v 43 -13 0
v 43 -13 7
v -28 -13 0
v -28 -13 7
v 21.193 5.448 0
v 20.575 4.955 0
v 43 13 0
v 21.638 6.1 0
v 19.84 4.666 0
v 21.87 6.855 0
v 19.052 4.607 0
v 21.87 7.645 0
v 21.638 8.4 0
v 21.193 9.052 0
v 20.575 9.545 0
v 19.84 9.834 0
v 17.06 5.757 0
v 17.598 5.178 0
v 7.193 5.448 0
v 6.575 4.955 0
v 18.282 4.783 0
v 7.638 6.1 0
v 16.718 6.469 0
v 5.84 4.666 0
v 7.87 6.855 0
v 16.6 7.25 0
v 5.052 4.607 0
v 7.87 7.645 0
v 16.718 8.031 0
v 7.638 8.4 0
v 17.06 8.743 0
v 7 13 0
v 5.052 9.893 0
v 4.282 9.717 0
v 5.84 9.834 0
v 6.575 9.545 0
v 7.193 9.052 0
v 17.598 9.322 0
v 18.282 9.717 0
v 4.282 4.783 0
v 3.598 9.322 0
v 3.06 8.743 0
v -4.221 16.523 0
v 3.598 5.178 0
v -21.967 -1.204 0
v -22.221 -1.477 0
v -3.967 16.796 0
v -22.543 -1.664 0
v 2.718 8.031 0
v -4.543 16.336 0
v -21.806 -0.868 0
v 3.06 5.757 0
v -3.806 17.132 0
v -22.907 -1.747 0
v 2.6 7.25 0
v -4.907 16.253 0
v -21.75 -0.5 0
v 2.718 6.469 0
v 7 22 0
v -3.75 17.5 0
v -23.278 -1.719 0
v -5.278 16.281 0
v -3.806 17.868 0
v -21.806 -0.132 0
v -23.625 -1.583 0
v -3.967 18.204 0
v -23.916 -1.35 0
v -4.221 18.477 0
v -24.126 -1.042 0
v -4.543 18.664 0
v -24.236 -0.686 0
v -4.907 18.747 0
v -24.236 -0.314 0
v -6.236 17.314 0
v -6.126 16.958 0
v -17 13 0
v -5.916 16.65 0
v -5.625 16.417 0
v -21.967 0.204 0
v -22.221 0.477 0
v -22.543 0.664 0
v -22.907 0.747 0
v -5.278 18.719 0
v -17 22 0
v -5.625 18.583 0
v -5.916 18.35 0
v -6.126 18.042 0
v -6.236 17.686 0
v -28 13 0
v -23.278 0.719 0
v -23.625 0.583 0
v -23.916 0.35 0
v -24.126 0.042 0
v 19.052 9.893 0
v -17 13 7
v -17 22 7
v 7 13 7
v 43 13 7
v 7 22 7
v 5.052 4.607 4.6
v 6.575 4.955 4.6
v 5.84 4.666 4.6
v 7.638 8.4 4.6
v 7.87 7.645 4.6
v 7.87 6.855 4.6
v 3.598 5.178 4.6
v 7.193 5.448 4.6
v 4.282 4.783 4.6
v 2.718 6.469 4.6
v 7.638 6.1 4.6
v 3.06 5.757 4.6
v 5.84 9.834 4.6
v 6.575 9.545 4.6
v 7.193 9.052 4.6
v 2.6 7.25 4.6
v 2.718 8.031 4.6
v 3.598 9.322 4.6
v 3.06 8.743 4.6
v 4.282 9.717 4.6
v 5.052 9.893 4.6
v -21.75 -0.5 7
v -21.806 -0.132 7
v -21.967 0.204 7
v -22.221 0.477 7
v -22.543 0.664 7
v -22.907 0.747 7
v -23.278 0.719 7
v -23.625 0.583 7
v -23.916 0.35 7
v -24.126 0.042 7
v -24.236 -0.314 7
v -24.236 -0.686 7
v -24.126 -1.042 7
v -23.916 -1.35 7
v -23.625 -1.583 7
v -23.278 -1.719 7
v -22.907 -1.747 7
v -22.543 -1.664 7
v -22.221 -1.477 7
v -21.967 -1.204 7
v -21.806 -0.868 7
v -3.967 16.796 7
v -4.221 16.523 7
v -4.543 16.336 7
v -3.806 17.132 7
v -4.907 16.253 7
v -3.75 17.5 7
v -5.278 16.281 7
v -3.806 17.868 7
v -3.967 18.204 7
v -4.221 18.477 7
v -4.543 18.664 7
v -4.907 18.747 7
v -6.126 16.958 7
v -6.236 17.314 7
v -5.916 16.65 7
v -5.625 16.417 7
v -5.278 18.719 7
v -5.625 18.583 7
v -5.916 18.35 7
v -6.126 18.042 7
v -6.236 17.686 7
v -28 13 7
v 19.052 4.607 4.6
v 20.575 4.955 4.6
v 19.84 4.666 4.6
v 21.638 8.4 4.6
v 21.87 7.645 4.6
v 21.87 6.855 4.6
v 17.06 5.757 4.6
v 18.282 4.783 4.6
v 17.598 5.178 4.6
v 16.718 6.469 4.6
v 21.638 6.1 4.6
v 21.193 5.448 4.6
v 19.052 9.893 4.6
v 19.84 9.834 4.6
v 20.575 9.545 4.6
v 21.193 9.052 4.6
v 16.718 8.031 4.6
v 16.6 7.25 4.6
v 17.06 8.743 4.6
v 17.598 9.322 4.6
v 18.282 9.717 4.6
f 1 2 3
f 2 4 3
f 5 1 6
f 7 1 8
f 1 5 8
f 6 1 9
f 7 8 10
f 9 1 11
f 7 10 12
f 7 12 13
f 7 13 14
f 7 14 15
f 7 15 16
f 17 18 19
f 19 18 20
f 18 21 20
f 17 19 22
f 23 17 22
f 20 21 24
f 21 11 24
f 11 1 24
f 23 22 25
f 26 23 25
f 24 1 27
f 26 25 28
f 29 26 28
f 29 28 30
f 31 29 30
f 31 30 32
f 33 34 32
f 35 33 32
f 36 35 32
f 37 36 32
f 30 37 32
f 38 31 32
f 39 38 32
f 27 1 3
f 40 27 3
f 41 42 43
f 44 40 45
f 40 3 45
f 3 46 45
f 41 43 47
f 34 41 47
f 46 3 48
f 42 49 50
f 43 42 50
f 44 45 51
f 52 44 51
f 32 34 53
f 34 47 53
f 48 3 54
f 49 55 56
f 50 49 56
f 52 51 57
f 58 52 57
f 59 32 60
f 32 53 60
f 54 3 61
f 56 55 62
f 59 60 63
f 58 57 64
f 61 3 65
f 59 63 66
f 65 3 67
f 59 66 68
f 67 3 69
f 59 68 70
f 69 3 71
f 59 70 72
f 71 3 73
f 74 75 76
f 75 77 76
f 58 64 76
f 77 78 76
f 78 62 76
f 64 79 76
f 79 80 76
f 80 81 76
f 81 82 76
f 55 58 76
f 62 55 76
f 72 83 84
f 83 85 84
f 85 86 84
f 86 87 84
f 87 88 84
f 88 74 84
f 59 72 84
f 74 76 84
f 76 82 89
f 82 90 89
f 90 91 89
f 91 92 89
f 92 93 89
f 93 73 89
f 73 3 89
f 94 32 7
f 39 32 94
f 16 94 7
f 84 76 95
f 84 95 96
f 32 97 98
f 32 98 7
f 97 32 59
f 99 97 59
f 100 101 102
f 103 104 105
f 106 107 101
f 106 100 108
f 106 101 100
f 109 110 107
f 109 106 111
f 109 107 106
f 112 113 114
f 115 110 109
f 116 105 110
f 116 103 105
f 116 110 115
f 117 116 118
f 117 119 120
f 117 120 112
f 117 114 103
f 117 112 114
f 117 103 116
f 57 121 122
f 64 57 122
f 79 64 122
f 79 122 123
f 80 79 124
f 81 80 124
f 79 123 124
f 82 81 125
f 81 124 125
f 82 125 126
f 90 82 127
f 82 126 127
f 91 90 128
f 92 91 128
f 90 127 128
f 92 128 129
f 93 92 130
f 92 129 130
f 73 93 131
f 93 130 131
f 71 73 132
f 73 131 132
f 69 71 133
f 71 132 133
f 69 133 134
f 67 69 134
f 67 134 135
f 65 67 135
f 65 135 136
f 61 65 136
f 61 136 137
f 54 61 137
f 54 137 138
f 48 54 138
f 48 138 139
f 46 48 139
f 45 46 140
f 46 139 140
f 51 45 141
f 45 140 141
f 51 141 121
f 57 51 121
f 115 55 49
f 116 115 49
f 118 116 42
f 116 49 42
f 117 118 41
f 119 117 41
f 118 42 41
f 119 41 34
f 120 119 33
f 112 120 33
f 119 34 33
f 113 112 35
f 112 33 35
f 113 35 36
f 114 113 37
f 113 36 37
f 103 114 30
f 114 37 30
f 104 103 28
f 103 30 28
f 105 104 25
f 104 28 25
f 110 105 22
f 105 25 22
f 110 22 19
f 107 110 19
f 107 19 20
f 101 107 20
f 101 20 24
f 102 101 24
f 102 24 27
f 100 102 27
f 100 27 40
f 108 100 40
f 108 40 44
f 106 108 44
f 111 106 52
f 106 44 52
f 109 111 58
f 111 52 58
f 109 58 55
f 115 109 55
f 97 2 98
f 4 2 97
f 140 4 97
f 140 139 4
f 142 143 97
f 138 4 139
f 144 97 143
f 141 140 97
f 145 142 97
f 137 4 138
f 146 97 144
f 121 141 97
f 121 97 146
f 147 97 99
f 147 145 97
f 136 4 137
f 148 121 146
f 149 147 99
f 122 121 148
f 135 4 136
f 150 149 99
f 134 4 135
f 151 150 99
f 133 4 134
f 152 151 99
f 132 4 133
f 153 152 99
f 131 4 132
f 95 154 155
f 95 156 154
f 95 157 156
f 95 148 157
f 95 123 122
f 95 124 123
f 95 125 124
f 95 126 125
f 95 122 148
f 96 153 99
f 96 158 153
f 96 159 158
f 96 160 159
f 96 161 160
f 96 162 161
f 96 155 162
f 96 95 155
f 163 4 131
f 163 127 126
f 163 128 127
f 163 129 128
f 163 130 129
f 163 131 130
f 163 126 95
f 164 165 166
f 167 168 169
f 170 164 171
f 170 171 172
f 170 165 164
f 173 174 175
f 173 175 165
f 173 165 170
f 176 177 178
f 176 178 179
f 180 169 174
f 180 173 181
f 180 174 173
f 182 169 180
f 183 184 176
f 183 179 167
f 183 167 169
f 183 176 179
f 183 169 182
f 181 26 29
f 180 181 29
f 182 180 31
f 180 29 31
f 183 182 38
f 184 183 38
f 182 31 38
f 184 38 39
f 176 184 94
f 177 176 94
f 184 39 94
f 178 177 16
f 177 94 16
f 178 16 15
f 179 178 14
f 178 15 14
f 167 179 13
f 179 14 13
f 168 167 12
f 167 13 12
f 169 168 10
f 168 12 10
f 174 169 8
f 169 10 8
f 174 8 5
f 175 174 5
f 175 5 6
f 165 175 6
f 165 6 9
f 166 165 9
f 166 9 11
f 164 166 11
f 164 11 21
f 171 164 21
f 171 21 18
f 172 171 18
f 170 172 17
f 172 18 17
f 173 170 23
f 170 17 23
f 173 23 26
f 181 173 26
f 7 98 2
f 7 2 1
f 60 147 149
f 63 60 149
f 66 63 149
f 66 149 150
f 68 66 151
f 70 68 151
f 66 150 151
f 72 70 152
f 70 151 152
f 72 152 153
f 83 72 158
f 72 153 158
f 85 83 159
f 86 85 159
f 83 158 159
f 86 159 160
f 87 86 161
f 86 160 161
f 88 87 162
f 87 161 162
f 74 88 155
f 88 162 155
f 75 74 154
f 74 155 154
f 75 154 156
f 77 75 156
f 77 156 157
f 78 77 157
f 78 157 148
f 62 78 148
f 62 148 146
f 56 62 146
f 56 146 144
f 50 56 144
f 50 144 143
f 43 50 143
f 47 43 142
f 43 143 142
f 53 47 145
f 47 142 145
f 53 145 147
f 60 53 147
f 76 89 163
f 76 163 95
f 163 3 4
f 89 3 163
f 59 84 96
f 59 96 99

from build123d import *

# Parameters (mm, degrees)
SKETCH1_W           = 56
SKETCH1_H           = 26
SKETCH1_W_2         = 24
SKETCH1_H_2         = 9
BOSS_EXTRUDE1_DEPTH = 7
SKETCH2_R           = 1.25
CUT_EXTRUDE1_DEPTH  = 7
SKETCH3_R           = 2.65
CUT_EXTRUDE2_DEPTH  = 4.6
SKETCH4_W           = 7
SKETCH4_H           = 26
BOSS_EXTRUDE2_DEPTH = 15


with BuildPart() as part:
    # Sketch1 → Boss-Extrude1 (new body)
    with BuildSketch(Plane.XY):
        Rectangle(SKETCH1_W, SKETCH1_H)
        with Locations((-5, 17.5)):
            Rectangle(SKETCH1_W_2, SKETCH1_H_2)
    extrude(amount=BOSS_EXTRUDE1_DEPTH)

    # Sketch2 → Cut-Extrude1 (cut)
    with BuildSketch(Plane.XY.offset(7)):
        with Locations((-5, 17.5)):
            Circle(SKETCH2_R)
        with Locations((-23, -0.5)):
            Circle(SKETCH2_R)
    extrude(amount=-CUT_EXTRUDE1_DEPTH, mode=Mode.SUBTRACT)

    # Sketch3 → Cut-Extrude2 (cut)
    with BuildSketch(Plane(origin=(0, 0, 0), x_dir=(-1, 0, 0), z_dir=(0, 0, -1))):
        with Locations((-5.25, 7.25)):
            Circle(SKETCH3_R)
        with Locations((-19.25, 7.25)):
            Circle(SKETCH3_R)
    extrude(amount=-CUT_EXTRUDE2_DEPTH, mode=Mode.SUBTRACT)

    # Sketch4 → Boss-Extrude2 (add)
    with BuildSketch(Plane(origin=(28, 0, 0), x_dir=(0, 0, -1), z_dir=(1, 0, 0))):
        with Locations((-3.5, 0)):
            Rectangle(SKETCH4_W, SKETCH4_H)
    extrude(amount=BOSS_EXTRUDE2_DEPTH)


solid = part.part
